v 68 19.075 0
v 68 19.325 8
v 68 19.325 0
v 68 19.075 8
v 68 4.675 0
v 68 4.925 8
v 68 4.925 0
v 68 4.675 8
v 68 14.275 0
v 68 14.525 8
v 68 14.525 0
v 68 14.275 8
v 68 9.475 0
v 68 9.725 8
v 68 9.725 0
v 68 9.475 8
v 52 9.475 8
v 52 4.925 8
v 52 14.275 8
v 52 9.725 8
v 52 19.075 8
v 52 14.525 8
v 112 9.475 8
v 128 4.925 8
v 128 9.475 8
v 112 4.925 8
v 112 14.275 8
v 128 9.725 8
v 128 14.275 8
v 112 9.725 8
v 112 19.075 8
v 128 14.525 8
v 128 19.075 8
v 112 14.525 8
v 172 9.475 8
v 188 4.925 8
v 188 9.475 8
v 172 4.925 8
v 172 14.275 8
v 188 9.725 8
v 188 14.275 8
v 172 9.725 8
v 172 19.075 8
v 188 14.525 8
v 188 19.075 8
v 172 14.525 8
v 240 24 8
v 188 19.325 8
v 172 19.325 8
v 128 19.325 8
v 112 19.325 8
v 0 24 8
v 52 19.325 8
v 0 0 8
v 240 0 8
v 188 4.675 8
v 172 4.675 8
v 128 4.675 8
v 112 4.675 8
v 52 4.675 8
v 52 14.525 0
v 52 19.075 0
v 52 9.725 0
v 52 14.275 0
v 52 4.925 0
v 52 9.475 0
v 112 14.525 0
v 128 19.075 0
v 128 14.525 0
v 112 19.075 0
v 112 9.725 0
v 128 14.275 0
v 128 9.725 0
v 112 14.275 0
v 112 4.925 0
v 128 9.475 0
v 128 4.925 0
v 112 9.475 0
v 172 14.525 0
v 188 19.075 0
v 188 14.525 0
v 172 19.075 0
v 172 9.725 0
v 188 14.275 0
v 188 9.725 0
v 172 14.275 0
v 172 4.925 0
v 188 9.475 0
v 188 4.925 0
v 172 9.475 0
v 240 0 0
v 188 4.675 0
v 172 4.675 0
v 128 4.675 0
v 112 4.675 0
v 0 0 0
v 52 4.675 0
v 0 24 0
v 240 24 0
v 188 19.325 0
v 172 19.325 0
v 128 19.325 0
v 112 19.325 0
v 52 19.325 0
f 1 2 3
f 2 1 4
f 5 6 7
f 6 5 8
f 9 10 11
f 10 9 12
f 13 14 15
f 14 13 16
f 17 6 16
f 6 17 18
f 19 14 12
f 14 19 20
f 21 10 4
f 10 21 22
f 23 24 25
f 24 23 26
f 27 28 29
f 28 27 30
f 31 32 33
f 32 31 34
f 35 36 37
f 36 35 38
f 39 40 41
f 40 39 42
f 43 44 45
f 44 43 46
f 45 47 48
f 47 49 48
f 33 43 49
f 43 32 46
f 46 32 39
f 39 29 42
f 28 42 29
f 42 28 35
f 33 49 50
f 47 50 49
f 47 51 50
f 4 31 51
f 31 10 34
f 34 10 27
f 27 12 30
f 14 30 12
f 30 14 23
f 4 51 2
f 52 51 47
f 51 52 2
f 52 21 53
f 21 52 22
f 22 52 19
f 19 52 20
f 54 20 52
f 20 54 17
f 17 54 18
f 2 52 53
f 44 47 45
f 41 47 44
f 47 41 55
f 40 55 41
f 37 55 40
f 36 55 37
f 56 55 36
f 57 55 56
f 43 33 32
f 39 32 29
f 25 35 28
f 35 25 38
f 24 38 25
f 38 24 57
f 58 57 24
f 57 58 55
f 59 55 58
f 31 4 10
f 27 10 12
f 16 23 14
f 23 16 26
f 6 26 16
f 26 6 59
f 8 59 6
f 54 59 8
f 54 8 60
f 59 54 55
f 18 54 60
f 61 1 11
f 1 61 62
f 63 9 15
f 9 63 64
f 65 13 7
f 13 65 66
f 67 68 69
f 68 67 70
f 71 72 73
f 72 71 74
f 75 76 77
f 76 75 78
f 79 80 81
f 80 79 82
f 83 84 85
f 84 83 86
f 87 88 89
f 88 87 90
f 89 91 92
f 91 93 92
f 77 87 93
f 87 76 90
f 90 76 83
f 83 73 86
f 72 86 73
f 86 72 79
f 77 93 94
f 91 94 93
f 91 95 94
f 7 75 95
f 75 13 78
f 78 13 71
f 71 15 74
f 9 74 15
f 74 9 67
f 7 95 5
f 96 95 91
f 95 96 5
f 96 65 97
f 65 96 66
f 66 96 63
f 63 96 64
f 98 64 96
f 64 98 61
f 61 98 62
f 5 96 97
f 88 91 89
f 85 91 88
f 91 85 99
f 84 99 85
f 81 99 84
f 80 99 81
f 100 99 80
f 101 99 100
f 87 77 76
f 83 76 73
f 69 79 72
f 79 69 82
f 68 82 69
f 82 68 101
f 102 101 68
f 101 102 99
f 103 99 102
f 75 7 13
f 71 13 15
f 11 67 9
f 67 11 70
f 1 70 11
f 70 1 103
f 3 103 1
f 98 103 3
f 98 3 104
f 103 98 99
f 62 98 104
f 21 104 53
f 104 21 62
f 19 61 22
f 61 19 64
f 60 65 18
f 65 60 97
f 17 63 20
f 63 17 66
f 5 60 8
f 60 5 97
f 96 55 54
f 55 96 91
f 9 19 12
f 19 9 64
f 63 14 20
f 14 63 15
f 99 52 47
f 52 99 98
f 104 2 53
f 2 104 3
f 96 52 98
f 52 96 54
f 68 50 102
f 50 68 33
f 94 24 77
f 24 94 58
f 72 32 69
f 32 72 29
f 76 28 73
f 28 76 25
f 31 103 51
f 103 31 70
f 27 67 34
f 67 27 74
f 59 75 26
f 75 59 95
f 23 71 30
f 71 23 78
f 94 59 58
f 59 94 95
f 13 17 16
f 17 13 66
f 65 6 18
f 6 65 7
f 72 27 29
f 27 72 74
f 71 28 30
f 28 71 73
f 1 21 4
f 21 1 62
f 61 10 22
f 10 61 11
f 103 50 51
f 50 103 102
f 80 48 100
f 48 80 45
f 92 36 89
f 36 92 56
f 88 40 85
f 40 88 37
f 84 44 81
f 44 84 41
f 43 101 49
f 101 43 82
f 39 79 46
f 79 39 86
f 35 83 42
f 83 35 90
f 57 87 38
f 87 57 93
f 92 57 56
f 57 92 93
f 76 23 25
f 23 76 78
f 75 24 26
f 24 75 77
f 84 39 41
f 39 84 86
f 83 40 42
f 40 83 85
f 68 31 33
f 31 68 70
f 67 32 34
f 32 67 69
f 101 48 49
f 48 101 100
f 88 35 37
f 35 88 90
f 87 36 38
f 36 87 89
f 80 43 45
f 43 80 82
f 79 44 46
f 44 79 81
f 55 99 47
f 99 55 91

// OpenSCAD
$fn = 64;
view = "assembly"; // [assembly, plate]

letter_size = 6;
revision_string = "1234567";

part_dx = 70;
part_dy = 130;
part_dz = 12;


module write_text(string) {
    z0 = - 0.25;
    dz= 0.5;
    translate([0, 0, z0]) {
        rotate([0,0,0]) {
            linear_extrude(dz) {
                font = "DejaVu Sans";
                text(string, size = letter_size, font = font,
                     halign = "center", valign = "center", $fn = 64);
            }
        }
    }
}

//
// 4-part X-split with finger joints
//
// Pieces are generated at assembled world positions.
// For each piece there is:
//   partN()      -> final solid for piece N
//   partN_pos()  -> positive/additive geometry for piece N
//   partN_neg()  -> negative/subtractive geometry for piece N
//
// You can replace the base body in body_pos()/body_neg() later with the
// real door-sweep profile and hole logic.
//

// ---------------- parameters ----------------

dx = 240;
dy = 24;
dz = 8;

line_count = 5;     // 5 bands => 3 fingers on one side, 2 on the other
finger_len = 8;
clearance  = 0.25;

// ---------------- helpers ----------------

function left_band(i) = (i % 2 == 0);

function clamp(v, lo, hi) = max(lo, min(hi, v));

function safe_gap(clearance, pitch) = clamp(clearance, 0, pitch * 0.95);

function c1(dx) = dx / 4;
function c2(dx) = dx / 2;
function c3(dx) = 3 * dx / 4;

function pitch_y(dy, line_count) = dy / max(1, floor(line_count));

function band_y0(i, dy, line_count, owner_left, clearance) =
    let(
        pitch = pitch_y(dy, line_count),
        g = safe_gap(clearance, pitch)
    )
    i * pitch +
    ((i > 0 && ((owner_left && !left_band(i - 1)) || (!owner_left && left_band(i - 1)))) ? g / 2 : 0);

function band_y1(i, dy, line_count, owner_left, clearance) =
    let(
        pitch = pitch_y(dy, line_count),
        g = safe_gap(clearance, pitch)
    )
    (i + 1) * pitch -
    ((i < max(1, floor(line_count)) - 1 &&
      ((owner_left && !left_band(i + 1)) || (!owner_left && left_band(i + 1)))) ? g / 2 : 0);

// ---------------- primitive bands ----------------

module band_pos(x0, x1, i, dy, dz, line_count, owner_left, clearance) {
    yy0 = band_y0(i, dy, line_count, owner_left, clearance);
    yy1 = band_y1(i, dy, line_count, owner_left, clearance);
    if (x1 > x0 && yy1 > yy0)
        translate([x0, yy0, 0])
            cube([x1 - x0, yy1 - yy0, dz]);
}

// full-band negative cutter, slightly oversized in Y/Z
module band_neg(x0, x1, i, dy, dz, line_count, owner_left, clearance) {
    eps = 0.01;
    yy0 = band_y0(i, dy, line_count, owner_left, clearance);
    yy1 = band_y1(i, dy, line_count, owner_left, clearance);
    if (x1 > x0 && yy1 > yy0)
        translate([x0 - eps, yy0 - eps, -eps])
            cube([x1 - x0 + 2*eps, yy1 - yy0 + 2*eps, dz + 2*eps]);
}

// ---------------- body hooks ----------------
//
// Replace these later with your real door sweep top profile and holes.
// For now they are just the full outer box.
//
// Convention:
//   body_pos() is the outer positive shape
//   body_neg() is any global subtraction (holes, pockets, etc.)
//

module body_pos() {
    cube([dx, dy, dz]);
}

module body_neg() {
    // Example placeholder:
    // translate([20, dy/2, -1]) cylinder(h=dz+2, r=2, $fn=32);

    // empty by default
}

// ---------------- piece positive geometry ----------------
//
// These are the actual volumes owned by each piece before global trimming.
//

module part1_pos() {
    lines = max(1, floor(line_count));
    flen  = max(0, finger_len);
    x1    = c1(dx);

    union() {
        cube([x1 - flen, dy, dz]);

        for (i = [0:lines-1])
            if (left_band(i))
                band_pos(x1 - flen, x1 + flen, i, dy, dz, line_count, true, clearance);
    }
}

module part2_pos() {
    lines = max(1, floor(line_count));
    flen  = max(0, finger_len);
    x1    = c1(dx);
    x2    = c2(dx);

    union() {
        translate([x1 + flen, 0, 0])
            cube([x2 - x1 - 2*flen, dy, dz]);

        for (i = [0:lines-1]) {
            if (!left_band(i))
                band_pos(x1 - flen, x1 + flen, i, dy, dz, line_count, false, clearance);
            if ( left_band(i))
                band_pos(x2 - flen, x2 + flen, i, dy, dz, line_count, true, clearance);
        }
    }
}

module part3_pos() {
    lines = max(1, floor(line_count));
    flen  = max(0, finger_len);
    x2    = c2(dx);
    x3    = c3(dx);

    union() {
        translate([x2 + flen, 0, 0])
            cube([x3 - x2 - 2*flen, dy, dz]);

        for (i = [0:lines-1]) {
            if (!left_band(i))
                band_pos(x2 - flen, x2 + flen, i, dy, dz, line_count, false, clearance);
            if ( left_band(i))
                band_pos(x3 - flen, x3 + flen, i, dy, dz, line_count, true, clearance);
        }
    }
}

module part4_pos() {
    lines = max(1, floor(line_count));
    flen  = max(0, finger_len);
    x3    = c3(dx);

    union() {
        translate([x3 + flen, 0, 0])
            cube([dx - x3 - flen, dy, dz]);

        for (i = [0:lines-1])
            if (!left_band(i))
                band_pos(x3 - flen, x3 + flen, i, dy, dz, line_count, false, clearance);
    }
}

// ---------------- piece negative geometry ----------------
//
// These subtract away everything not belonging to the piece.
// They also include body_neg(), so holes move with the piece automatically.
//

module part1_neg() {
    union() {
        body_neg();

        // remove everything to the right of piece 1 domain
        translate([c1(dx) + finger_len, -1, -1])
            cube([dx, dy + 2, dz + 2]);
    }
}

module part2_neg() {
    union() {
        body_neg();

        // remove far left
        translate([-1, -1, -1])
            cube([c1(dx) - finger_len + 1, dy + 2, dz + 2]);

        // remove far right
        translate([c2(dx) + finger_len, -1, -1])
            cube([dx, dy + 2, dz + 2]);
    }
}

module part3_neg() {
    union() {
        body_neg();

        // remove far left
        translate([-1, -1, -1])
            cube([c2(dx) - finger_len + 1, dy + 2, dz + 2]);

        // remove far right
        translate([c3(dx) + finger_len, -1, -1])
            cube([dx, dy + 2, dz + 2]);
    }
}

module part4_neg() {
    union() {
        body_neg();

        // remove everything left of piece 4 domain
        translate([-1, -1, -1])
            cube([c3(dx) - finger_len + 1, dy + 2, dz + 2]);
    }
    %cylinder(h=12, d=5);
}

// ---------------- final pieces ----------------
//
// Final pattern:
//   difference() {
//      intersection(body_pos, partN_pos)
//      partN_neg()
//   }
//
// This makes it easy to swap in a real profile later.
//

module part1() {
    difference() {
        intersection() {
            body_pos();
            part1_pos();
        }
        part1_neg();
    }
}

module part2() {
    difference() {
        intersection() {
            body_pos();
            part2_pos();
        }
        part2_neg();
    }
}

module part3() {
    difference() {
        intersection() {
            body_pos();
            part3_pos();
        }
        part3_neg();
    }
}

module part4() {
    difference() {
        intersection() {
            body_pos();
            part4_pos();
        }
        part4_neg();
    }
}

// ---------------- demo ----------------

module assembly(explode=0) {
    // exploded preview example:
    translate([0*explode, 0, 0]) color("gold")       part1();
    translate([1*explode, 0, 0]) color("lightblue")  part2();
    translate([2*explode, 0, 0]) color("orange")     part3();
    translate([3*explode, 0, 0]) color("lightgreen") part4();
}


if (view == "part") {
  part();
}

if (view == "plate") {
  assembly(0);
}

if (view == "assembly") {
  assembly(0);
}
